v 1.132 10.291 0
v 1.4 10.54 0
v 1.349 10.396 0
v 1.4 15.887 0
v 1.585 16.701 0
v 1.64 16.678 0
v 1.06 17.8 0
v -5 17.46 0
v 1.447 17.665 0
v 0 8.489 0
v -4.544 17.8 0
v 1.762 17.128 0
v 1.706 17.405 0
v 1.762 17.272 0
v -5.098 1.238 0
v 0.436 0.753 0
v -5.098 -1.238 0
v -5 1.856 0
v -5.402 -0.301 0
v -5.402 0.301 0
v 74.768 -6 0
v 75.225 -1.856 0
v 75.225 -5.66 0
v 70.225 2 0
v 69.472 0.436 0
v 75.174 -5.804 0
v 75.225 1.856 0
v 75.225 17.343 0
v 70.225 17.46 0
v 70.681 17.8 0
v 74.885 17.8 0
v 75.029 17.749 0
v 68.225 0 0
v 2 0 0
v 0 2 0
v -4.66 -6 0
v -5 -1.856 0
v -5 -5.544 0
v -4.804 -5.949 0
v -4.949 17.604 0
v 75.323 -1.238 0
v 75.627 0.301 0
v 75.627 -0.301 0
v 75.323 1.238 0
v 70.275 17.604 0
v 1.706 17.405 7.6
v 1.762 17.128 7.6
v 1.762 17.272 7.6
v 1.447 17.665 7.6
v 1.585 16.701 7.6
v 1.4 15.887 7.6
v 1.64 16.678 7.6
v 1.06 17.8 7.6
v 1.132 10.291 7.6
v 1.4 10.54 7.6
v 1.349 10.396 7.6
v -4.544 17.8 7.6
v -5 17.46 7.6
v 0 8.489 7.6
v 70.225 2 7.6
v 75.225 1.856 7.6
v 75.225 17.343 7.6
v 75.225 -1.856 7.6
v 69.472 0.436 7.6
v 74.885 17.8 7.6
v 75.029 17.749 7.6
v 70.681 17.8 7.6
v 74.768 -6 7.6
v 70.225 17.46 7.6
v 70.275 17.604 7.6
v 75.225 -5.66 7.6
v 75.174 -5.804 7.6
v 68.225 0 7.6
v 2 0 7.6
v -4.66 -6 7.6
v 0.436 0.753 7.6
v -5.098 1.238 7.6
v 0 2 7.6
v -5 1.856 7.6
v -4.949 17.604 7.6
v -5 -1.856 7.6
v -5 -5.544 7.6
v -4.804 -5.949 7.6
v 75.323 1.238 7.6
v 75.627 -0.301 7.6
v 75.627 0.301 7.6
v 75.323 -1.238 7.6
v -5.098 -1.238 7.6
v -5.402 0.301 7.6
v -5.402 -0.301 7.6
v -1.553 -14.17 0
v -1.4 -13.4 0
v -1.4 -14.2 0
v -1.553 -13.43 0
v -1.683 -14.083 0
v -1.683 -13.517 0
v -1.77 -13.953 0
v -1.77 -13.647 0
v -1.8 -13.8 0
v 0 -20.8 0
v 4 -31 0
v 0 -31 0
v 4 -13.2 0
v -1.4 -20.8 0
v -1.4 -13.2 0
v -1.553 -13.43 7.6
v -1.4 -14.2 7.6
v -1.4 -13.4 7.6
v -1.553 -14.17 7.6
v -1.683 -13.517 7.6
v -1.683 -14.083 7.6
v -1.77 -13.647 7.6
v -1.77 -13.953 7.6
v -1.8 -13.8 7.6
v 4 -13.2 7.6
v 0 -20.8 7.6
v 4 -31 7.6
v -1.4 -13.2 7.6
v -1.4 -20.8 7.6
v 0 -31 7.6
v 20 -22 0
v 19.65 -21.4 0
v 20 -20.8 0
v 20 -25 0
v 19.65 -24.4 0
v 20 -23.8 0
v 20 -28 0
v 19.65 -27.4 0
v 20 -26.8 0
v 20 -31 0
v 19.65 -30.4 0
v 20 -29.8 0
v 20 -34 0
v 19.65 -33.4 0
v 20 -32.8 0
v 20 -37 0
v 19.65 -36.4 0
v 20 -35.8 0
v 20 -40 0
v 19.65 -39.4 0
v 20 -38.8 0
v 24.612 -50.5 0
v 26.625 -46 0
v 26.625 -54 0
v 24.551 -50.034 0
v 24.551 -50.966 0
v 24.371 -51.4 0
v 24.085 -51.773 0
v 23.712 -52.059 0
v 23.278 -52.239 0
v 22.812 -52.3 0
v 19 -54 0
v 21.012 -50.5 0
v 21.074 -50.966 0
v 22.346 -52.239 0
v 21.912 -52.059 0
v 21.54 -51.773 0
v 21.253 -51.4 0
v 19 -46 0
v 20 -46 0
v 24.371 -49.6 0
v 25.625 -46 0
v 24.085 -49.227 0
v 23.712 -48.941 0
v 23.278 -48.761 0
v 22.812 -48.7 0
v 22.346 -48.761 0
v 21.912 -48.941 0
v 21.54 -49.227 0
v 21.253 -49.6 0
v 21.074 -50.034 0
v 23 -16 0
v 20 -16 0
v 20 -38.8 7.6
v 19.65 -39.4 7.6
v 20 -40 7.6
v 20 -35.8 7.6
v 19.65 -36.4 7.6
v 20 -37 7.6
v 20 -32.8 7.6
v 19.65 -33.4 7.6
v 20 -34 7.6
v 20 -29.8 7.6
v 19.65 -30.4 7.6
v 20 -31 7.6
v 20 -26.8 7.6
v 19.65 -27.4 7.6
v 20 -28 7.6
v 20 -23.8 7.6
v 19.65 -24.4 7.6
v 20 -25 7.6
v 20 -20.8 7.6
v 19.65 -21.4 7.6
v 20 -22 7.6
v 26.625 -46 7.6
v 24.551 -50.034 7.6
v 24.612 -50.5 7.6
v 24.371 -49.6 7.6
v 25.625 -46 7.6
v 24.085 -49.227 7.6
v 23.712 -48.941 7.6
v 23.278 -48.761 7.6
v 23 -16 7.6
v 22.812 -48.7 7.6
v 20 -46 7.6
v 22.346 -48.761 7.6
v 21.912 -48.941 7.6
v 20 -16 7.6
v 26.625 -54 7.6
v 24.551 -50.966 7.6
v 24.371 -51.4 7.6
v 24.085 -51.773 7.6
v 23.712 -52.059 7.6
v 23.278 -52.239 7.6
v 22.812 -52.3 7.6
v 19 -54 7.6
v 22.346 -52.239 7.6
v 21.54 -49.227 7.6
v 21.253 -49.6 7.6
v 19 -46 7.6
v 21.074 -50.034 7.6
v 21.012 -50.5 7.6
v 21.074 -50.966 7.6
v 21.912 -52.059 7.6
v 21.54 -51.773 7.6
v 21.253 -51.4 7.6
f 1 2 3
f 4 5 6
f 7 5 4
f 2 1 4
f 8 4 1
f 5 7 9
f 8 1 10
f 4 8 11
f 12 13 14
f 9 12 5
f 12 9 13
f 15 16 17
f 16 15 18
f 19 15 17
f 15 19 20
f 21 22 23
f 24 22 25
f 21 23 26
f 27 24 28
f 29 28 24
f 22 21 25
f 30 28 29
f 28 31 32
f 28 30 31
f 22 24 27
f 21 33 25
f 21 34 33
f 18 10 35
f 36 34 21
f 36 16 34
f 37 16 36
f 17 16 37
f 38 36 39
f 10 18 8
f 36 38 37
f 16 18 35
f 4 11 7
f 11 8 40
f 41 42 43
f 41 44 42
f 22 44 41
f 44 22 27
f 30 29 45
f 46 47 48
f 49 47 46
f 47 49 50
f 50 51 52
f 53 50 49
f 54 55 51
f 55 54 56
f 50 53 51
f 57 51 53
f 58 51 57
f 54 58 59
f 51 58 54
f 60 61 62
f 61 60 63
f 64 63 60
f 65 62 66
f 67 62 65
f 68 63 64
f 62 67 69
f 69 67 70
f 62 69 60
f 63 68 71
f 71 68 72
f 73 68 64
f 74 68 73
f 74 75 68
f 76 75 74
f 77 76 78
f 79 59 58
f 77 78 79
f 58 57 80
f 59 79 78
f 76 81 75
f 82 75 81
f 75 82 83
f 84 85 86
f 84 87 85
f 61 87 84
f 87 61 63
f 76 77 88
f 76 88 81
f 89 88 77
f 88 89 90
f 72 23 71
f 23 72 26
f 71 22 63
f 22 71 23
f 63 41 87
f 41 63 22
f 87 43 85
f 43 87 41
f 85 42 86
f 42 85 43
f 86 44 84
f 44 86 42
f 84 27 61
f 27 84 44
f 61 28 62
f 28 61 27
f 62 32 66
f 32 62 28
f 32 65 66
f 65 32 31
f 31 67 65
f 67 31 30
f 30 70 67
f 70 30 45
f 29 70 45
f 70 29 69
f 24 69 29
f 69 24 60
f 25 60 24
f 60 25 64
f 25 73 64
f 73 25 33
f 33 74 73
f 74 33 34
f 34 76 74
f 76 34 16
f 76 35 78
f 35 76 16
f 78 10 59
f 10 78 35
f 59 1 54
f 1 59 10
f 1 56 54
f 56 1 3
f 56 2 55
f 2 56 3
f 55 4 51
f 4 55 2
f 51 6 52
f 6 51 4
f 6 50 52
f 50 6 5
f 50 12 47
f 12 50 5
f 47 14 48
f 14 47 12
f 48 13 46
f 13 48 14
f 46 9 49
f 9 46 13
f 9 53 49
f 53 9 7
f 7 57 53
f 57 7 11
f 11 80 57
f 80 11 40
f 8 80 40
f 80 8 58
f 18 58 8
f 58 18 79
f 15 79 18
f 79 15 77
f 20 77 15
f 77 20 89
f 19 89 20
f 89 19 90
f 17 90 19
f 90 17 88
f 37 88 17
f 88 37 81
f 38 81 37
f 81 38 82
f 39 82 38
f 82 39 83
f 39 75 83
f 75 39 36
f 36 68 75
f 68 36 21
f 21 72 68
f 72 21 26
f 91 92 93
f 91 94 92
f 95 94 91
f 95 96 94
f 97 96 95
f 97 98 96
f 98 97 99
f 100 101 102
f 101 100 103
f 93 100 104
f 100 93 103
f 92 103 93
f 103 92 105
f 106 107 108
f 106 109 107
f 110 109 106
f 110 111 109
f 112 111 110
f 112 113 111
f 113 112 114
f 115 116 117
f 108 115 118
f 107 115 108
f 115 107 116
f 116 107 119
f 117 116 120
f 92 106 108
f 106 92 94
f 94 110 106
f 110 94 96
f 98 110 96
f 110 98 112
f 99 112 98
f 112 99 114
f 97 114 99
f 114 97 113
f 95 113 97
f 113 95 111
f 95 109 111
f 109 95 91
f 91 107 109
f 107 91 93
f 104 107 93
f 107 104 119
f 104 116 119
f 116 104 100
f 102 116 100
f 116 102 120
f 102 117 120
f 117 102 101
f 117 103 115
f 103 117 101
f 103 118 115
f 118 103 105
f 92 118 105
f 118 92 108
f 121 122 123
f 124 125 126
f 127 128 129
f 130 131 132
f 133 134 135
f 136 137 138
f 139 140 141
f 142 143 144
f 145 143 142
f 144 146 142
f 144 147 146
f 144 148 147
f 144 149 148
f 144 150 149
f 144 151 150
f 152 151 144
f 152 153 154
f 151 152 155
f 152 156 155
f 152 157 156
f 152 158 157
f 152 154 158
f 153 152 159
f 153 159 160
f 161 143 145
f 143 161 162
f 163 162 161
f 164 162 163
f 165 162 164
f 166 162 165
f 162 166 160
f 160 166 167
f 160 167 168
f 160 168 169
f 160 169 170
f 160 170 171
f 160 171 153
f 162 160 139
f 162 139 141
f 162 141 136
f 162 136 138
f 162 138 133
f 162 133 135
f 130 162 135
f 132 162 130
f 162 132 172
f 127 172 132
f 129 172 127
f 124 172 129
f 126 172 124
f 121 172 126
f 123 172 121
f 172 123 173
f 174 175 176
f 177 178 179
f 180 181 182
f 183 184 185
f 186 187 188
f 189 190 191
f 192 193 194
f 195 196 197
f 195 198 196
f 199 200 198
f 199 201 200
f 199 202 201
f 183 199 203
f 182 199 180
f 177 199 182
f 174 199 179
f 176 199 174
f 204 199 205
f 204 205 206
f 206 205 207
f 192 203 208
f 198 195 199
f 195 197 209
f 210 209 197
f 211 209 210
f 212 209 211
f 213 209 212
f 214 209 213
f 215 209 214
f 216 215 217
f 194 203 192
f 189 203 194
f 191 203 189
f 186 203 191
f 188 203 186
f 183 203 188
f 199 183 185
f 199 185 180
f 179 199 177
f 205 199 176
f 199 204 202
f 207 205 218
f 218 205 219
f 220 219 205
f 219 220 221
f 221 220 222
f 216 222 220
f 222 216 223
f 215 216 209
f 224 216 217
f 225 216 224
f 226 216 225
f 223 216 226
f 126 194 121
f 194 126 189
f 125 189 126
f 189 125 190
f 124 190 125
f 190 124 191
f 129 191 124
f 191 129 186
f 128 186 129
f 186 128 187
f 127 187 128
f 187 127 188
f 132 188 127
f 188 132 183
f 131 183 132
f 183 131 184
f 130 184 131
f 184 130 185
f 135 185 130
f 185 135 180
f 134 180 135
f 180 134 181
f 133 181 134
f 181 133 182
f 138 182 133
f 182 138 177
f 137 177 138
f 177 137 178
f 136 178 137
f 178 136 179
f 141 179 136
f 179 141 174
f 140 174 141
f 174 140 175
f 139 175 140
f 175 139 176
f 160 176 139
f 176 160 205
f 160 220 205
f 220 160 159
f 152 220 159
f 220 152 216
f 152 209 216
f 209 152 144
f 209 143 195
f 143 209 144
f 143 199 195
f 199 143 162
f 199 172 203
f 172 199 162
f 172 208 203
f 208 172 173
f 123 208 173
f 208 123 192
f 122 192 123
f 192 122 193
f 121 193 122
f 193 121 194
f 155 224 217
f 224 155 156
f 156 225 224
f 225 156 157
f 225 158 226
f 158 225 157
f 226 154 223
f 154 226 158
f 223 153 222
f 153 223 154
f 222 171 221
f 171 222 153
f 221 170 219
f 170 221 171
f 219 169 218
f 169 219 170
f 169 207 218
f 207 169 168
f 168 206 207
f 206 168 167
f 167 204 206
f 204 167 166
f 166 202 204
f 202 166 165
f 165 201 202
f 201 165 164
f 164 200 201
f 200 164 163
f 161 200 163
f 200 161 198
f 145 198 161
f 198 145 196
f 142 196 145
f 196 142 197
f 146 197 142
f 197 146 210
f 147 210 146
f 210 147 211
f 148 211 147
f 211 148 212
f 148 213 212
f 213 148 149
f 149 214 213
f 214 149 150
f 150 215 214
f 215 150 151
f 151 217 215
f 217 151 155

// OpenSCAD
// Moldmaker wedge U-clip — parametric. Print flat (Z = slot height), PETG.
// back spine 6 mm (>=5), arms 5 mm (>=4), inner corners R2, wedge 5 deg self-locking
slot=8; clr=0.2;            // app clampSlot; lug = slot-2*clr = 7.6
slot_depth=1.65;            // app: min(wall*0.55, wall-0.9) @ wall 3
boxD=60;                    // outer box depth (Y in app), between the 2 slot faces
reach=14;                   // arm length from spine to lug centre
part="all";                 // all | frame | jaw | wedge | assembly
lug=slot-2*clr; T=lug;      // part thickness = lug height
arm=5; spine=6; taper=5; wedgeL=30; wedgeW0=3;
gapW=wedgeW0+wedgeL*tan(taper)+0.6; jawW=4;
L=boxD+2*arm+jawW+gapW;
module frame(){
  linear_extrude(T) offset(r=-2) offset(r=2) difference(){
    union(){
      translate([-arm,-spine]) square([L,spine]);
      translate([-arm,0]) square([arm,reach+lug/2]);            // fixed arm
      translate([boxD+jawW+gapW,0]) square([arm,reach+lug/2]);  // outer arm
      translate([0,reach-lug/2]) square([slot_depth-0.25,lug]); // lug
      translate([slot_depth-0.25,reach+lug/2-0.6]) circle(0.4,$fn=16); // 0.4 detent bump at tip
      for(x=[-arm,boxD+jawW+gapW]) translate([x+arm/2,0]) circle(3); // root fillets / ribs
    }
  }
}
module jaw(){ linear_extrude(T) union(){
  square([jawW,reach+lug/2]);
  translate([-(slot_depth-0.25),reach-lug/2]) square([slot_depth-0.25,lug]);
  translate([-(slot_depth-0.25),reach+lug/2-0.6]) circle(0.4,$fn=16);}} // detent bump
module wedge(){ linear_extrude(T) union(){
  polygon([[0,0],[wedgeW0+wedgeL*tan(taper),0],[wedgeW0,wedgeL],[0,wedgeL]]);
  for(y=[6:3:24]) translate([0,y]) polygon([[0,0],[-0.35,0.6],[0,1.2]]);   // ratchet teeth vs jaw
  translate([-1,-8]) difference(){square([wedgeW0+wedgeL*tan(taper)+2,8]); translate([(wedgeW0+wedgeL*tan(taper)+2)/2,3.5]) circle(1.8,$fn=24);} // pull tab
}}
if(part=="frame") frame();
else if(part=="jaw") jaw();
else if(part=="wedge") wedge();
else if(part=="assembly"){ frame(); color("orange") translate([boxD,0,0]) jaw();
  color("red") translate([boxD+jawW,1,0]) wedge();
  %translate([0,-2,-10]) cube([boxD,reach+20,30]); }
else { frame(); translate([0,-spine-25,0]) jaw(); translate([20,-spine-40,0]) wedge(); }
